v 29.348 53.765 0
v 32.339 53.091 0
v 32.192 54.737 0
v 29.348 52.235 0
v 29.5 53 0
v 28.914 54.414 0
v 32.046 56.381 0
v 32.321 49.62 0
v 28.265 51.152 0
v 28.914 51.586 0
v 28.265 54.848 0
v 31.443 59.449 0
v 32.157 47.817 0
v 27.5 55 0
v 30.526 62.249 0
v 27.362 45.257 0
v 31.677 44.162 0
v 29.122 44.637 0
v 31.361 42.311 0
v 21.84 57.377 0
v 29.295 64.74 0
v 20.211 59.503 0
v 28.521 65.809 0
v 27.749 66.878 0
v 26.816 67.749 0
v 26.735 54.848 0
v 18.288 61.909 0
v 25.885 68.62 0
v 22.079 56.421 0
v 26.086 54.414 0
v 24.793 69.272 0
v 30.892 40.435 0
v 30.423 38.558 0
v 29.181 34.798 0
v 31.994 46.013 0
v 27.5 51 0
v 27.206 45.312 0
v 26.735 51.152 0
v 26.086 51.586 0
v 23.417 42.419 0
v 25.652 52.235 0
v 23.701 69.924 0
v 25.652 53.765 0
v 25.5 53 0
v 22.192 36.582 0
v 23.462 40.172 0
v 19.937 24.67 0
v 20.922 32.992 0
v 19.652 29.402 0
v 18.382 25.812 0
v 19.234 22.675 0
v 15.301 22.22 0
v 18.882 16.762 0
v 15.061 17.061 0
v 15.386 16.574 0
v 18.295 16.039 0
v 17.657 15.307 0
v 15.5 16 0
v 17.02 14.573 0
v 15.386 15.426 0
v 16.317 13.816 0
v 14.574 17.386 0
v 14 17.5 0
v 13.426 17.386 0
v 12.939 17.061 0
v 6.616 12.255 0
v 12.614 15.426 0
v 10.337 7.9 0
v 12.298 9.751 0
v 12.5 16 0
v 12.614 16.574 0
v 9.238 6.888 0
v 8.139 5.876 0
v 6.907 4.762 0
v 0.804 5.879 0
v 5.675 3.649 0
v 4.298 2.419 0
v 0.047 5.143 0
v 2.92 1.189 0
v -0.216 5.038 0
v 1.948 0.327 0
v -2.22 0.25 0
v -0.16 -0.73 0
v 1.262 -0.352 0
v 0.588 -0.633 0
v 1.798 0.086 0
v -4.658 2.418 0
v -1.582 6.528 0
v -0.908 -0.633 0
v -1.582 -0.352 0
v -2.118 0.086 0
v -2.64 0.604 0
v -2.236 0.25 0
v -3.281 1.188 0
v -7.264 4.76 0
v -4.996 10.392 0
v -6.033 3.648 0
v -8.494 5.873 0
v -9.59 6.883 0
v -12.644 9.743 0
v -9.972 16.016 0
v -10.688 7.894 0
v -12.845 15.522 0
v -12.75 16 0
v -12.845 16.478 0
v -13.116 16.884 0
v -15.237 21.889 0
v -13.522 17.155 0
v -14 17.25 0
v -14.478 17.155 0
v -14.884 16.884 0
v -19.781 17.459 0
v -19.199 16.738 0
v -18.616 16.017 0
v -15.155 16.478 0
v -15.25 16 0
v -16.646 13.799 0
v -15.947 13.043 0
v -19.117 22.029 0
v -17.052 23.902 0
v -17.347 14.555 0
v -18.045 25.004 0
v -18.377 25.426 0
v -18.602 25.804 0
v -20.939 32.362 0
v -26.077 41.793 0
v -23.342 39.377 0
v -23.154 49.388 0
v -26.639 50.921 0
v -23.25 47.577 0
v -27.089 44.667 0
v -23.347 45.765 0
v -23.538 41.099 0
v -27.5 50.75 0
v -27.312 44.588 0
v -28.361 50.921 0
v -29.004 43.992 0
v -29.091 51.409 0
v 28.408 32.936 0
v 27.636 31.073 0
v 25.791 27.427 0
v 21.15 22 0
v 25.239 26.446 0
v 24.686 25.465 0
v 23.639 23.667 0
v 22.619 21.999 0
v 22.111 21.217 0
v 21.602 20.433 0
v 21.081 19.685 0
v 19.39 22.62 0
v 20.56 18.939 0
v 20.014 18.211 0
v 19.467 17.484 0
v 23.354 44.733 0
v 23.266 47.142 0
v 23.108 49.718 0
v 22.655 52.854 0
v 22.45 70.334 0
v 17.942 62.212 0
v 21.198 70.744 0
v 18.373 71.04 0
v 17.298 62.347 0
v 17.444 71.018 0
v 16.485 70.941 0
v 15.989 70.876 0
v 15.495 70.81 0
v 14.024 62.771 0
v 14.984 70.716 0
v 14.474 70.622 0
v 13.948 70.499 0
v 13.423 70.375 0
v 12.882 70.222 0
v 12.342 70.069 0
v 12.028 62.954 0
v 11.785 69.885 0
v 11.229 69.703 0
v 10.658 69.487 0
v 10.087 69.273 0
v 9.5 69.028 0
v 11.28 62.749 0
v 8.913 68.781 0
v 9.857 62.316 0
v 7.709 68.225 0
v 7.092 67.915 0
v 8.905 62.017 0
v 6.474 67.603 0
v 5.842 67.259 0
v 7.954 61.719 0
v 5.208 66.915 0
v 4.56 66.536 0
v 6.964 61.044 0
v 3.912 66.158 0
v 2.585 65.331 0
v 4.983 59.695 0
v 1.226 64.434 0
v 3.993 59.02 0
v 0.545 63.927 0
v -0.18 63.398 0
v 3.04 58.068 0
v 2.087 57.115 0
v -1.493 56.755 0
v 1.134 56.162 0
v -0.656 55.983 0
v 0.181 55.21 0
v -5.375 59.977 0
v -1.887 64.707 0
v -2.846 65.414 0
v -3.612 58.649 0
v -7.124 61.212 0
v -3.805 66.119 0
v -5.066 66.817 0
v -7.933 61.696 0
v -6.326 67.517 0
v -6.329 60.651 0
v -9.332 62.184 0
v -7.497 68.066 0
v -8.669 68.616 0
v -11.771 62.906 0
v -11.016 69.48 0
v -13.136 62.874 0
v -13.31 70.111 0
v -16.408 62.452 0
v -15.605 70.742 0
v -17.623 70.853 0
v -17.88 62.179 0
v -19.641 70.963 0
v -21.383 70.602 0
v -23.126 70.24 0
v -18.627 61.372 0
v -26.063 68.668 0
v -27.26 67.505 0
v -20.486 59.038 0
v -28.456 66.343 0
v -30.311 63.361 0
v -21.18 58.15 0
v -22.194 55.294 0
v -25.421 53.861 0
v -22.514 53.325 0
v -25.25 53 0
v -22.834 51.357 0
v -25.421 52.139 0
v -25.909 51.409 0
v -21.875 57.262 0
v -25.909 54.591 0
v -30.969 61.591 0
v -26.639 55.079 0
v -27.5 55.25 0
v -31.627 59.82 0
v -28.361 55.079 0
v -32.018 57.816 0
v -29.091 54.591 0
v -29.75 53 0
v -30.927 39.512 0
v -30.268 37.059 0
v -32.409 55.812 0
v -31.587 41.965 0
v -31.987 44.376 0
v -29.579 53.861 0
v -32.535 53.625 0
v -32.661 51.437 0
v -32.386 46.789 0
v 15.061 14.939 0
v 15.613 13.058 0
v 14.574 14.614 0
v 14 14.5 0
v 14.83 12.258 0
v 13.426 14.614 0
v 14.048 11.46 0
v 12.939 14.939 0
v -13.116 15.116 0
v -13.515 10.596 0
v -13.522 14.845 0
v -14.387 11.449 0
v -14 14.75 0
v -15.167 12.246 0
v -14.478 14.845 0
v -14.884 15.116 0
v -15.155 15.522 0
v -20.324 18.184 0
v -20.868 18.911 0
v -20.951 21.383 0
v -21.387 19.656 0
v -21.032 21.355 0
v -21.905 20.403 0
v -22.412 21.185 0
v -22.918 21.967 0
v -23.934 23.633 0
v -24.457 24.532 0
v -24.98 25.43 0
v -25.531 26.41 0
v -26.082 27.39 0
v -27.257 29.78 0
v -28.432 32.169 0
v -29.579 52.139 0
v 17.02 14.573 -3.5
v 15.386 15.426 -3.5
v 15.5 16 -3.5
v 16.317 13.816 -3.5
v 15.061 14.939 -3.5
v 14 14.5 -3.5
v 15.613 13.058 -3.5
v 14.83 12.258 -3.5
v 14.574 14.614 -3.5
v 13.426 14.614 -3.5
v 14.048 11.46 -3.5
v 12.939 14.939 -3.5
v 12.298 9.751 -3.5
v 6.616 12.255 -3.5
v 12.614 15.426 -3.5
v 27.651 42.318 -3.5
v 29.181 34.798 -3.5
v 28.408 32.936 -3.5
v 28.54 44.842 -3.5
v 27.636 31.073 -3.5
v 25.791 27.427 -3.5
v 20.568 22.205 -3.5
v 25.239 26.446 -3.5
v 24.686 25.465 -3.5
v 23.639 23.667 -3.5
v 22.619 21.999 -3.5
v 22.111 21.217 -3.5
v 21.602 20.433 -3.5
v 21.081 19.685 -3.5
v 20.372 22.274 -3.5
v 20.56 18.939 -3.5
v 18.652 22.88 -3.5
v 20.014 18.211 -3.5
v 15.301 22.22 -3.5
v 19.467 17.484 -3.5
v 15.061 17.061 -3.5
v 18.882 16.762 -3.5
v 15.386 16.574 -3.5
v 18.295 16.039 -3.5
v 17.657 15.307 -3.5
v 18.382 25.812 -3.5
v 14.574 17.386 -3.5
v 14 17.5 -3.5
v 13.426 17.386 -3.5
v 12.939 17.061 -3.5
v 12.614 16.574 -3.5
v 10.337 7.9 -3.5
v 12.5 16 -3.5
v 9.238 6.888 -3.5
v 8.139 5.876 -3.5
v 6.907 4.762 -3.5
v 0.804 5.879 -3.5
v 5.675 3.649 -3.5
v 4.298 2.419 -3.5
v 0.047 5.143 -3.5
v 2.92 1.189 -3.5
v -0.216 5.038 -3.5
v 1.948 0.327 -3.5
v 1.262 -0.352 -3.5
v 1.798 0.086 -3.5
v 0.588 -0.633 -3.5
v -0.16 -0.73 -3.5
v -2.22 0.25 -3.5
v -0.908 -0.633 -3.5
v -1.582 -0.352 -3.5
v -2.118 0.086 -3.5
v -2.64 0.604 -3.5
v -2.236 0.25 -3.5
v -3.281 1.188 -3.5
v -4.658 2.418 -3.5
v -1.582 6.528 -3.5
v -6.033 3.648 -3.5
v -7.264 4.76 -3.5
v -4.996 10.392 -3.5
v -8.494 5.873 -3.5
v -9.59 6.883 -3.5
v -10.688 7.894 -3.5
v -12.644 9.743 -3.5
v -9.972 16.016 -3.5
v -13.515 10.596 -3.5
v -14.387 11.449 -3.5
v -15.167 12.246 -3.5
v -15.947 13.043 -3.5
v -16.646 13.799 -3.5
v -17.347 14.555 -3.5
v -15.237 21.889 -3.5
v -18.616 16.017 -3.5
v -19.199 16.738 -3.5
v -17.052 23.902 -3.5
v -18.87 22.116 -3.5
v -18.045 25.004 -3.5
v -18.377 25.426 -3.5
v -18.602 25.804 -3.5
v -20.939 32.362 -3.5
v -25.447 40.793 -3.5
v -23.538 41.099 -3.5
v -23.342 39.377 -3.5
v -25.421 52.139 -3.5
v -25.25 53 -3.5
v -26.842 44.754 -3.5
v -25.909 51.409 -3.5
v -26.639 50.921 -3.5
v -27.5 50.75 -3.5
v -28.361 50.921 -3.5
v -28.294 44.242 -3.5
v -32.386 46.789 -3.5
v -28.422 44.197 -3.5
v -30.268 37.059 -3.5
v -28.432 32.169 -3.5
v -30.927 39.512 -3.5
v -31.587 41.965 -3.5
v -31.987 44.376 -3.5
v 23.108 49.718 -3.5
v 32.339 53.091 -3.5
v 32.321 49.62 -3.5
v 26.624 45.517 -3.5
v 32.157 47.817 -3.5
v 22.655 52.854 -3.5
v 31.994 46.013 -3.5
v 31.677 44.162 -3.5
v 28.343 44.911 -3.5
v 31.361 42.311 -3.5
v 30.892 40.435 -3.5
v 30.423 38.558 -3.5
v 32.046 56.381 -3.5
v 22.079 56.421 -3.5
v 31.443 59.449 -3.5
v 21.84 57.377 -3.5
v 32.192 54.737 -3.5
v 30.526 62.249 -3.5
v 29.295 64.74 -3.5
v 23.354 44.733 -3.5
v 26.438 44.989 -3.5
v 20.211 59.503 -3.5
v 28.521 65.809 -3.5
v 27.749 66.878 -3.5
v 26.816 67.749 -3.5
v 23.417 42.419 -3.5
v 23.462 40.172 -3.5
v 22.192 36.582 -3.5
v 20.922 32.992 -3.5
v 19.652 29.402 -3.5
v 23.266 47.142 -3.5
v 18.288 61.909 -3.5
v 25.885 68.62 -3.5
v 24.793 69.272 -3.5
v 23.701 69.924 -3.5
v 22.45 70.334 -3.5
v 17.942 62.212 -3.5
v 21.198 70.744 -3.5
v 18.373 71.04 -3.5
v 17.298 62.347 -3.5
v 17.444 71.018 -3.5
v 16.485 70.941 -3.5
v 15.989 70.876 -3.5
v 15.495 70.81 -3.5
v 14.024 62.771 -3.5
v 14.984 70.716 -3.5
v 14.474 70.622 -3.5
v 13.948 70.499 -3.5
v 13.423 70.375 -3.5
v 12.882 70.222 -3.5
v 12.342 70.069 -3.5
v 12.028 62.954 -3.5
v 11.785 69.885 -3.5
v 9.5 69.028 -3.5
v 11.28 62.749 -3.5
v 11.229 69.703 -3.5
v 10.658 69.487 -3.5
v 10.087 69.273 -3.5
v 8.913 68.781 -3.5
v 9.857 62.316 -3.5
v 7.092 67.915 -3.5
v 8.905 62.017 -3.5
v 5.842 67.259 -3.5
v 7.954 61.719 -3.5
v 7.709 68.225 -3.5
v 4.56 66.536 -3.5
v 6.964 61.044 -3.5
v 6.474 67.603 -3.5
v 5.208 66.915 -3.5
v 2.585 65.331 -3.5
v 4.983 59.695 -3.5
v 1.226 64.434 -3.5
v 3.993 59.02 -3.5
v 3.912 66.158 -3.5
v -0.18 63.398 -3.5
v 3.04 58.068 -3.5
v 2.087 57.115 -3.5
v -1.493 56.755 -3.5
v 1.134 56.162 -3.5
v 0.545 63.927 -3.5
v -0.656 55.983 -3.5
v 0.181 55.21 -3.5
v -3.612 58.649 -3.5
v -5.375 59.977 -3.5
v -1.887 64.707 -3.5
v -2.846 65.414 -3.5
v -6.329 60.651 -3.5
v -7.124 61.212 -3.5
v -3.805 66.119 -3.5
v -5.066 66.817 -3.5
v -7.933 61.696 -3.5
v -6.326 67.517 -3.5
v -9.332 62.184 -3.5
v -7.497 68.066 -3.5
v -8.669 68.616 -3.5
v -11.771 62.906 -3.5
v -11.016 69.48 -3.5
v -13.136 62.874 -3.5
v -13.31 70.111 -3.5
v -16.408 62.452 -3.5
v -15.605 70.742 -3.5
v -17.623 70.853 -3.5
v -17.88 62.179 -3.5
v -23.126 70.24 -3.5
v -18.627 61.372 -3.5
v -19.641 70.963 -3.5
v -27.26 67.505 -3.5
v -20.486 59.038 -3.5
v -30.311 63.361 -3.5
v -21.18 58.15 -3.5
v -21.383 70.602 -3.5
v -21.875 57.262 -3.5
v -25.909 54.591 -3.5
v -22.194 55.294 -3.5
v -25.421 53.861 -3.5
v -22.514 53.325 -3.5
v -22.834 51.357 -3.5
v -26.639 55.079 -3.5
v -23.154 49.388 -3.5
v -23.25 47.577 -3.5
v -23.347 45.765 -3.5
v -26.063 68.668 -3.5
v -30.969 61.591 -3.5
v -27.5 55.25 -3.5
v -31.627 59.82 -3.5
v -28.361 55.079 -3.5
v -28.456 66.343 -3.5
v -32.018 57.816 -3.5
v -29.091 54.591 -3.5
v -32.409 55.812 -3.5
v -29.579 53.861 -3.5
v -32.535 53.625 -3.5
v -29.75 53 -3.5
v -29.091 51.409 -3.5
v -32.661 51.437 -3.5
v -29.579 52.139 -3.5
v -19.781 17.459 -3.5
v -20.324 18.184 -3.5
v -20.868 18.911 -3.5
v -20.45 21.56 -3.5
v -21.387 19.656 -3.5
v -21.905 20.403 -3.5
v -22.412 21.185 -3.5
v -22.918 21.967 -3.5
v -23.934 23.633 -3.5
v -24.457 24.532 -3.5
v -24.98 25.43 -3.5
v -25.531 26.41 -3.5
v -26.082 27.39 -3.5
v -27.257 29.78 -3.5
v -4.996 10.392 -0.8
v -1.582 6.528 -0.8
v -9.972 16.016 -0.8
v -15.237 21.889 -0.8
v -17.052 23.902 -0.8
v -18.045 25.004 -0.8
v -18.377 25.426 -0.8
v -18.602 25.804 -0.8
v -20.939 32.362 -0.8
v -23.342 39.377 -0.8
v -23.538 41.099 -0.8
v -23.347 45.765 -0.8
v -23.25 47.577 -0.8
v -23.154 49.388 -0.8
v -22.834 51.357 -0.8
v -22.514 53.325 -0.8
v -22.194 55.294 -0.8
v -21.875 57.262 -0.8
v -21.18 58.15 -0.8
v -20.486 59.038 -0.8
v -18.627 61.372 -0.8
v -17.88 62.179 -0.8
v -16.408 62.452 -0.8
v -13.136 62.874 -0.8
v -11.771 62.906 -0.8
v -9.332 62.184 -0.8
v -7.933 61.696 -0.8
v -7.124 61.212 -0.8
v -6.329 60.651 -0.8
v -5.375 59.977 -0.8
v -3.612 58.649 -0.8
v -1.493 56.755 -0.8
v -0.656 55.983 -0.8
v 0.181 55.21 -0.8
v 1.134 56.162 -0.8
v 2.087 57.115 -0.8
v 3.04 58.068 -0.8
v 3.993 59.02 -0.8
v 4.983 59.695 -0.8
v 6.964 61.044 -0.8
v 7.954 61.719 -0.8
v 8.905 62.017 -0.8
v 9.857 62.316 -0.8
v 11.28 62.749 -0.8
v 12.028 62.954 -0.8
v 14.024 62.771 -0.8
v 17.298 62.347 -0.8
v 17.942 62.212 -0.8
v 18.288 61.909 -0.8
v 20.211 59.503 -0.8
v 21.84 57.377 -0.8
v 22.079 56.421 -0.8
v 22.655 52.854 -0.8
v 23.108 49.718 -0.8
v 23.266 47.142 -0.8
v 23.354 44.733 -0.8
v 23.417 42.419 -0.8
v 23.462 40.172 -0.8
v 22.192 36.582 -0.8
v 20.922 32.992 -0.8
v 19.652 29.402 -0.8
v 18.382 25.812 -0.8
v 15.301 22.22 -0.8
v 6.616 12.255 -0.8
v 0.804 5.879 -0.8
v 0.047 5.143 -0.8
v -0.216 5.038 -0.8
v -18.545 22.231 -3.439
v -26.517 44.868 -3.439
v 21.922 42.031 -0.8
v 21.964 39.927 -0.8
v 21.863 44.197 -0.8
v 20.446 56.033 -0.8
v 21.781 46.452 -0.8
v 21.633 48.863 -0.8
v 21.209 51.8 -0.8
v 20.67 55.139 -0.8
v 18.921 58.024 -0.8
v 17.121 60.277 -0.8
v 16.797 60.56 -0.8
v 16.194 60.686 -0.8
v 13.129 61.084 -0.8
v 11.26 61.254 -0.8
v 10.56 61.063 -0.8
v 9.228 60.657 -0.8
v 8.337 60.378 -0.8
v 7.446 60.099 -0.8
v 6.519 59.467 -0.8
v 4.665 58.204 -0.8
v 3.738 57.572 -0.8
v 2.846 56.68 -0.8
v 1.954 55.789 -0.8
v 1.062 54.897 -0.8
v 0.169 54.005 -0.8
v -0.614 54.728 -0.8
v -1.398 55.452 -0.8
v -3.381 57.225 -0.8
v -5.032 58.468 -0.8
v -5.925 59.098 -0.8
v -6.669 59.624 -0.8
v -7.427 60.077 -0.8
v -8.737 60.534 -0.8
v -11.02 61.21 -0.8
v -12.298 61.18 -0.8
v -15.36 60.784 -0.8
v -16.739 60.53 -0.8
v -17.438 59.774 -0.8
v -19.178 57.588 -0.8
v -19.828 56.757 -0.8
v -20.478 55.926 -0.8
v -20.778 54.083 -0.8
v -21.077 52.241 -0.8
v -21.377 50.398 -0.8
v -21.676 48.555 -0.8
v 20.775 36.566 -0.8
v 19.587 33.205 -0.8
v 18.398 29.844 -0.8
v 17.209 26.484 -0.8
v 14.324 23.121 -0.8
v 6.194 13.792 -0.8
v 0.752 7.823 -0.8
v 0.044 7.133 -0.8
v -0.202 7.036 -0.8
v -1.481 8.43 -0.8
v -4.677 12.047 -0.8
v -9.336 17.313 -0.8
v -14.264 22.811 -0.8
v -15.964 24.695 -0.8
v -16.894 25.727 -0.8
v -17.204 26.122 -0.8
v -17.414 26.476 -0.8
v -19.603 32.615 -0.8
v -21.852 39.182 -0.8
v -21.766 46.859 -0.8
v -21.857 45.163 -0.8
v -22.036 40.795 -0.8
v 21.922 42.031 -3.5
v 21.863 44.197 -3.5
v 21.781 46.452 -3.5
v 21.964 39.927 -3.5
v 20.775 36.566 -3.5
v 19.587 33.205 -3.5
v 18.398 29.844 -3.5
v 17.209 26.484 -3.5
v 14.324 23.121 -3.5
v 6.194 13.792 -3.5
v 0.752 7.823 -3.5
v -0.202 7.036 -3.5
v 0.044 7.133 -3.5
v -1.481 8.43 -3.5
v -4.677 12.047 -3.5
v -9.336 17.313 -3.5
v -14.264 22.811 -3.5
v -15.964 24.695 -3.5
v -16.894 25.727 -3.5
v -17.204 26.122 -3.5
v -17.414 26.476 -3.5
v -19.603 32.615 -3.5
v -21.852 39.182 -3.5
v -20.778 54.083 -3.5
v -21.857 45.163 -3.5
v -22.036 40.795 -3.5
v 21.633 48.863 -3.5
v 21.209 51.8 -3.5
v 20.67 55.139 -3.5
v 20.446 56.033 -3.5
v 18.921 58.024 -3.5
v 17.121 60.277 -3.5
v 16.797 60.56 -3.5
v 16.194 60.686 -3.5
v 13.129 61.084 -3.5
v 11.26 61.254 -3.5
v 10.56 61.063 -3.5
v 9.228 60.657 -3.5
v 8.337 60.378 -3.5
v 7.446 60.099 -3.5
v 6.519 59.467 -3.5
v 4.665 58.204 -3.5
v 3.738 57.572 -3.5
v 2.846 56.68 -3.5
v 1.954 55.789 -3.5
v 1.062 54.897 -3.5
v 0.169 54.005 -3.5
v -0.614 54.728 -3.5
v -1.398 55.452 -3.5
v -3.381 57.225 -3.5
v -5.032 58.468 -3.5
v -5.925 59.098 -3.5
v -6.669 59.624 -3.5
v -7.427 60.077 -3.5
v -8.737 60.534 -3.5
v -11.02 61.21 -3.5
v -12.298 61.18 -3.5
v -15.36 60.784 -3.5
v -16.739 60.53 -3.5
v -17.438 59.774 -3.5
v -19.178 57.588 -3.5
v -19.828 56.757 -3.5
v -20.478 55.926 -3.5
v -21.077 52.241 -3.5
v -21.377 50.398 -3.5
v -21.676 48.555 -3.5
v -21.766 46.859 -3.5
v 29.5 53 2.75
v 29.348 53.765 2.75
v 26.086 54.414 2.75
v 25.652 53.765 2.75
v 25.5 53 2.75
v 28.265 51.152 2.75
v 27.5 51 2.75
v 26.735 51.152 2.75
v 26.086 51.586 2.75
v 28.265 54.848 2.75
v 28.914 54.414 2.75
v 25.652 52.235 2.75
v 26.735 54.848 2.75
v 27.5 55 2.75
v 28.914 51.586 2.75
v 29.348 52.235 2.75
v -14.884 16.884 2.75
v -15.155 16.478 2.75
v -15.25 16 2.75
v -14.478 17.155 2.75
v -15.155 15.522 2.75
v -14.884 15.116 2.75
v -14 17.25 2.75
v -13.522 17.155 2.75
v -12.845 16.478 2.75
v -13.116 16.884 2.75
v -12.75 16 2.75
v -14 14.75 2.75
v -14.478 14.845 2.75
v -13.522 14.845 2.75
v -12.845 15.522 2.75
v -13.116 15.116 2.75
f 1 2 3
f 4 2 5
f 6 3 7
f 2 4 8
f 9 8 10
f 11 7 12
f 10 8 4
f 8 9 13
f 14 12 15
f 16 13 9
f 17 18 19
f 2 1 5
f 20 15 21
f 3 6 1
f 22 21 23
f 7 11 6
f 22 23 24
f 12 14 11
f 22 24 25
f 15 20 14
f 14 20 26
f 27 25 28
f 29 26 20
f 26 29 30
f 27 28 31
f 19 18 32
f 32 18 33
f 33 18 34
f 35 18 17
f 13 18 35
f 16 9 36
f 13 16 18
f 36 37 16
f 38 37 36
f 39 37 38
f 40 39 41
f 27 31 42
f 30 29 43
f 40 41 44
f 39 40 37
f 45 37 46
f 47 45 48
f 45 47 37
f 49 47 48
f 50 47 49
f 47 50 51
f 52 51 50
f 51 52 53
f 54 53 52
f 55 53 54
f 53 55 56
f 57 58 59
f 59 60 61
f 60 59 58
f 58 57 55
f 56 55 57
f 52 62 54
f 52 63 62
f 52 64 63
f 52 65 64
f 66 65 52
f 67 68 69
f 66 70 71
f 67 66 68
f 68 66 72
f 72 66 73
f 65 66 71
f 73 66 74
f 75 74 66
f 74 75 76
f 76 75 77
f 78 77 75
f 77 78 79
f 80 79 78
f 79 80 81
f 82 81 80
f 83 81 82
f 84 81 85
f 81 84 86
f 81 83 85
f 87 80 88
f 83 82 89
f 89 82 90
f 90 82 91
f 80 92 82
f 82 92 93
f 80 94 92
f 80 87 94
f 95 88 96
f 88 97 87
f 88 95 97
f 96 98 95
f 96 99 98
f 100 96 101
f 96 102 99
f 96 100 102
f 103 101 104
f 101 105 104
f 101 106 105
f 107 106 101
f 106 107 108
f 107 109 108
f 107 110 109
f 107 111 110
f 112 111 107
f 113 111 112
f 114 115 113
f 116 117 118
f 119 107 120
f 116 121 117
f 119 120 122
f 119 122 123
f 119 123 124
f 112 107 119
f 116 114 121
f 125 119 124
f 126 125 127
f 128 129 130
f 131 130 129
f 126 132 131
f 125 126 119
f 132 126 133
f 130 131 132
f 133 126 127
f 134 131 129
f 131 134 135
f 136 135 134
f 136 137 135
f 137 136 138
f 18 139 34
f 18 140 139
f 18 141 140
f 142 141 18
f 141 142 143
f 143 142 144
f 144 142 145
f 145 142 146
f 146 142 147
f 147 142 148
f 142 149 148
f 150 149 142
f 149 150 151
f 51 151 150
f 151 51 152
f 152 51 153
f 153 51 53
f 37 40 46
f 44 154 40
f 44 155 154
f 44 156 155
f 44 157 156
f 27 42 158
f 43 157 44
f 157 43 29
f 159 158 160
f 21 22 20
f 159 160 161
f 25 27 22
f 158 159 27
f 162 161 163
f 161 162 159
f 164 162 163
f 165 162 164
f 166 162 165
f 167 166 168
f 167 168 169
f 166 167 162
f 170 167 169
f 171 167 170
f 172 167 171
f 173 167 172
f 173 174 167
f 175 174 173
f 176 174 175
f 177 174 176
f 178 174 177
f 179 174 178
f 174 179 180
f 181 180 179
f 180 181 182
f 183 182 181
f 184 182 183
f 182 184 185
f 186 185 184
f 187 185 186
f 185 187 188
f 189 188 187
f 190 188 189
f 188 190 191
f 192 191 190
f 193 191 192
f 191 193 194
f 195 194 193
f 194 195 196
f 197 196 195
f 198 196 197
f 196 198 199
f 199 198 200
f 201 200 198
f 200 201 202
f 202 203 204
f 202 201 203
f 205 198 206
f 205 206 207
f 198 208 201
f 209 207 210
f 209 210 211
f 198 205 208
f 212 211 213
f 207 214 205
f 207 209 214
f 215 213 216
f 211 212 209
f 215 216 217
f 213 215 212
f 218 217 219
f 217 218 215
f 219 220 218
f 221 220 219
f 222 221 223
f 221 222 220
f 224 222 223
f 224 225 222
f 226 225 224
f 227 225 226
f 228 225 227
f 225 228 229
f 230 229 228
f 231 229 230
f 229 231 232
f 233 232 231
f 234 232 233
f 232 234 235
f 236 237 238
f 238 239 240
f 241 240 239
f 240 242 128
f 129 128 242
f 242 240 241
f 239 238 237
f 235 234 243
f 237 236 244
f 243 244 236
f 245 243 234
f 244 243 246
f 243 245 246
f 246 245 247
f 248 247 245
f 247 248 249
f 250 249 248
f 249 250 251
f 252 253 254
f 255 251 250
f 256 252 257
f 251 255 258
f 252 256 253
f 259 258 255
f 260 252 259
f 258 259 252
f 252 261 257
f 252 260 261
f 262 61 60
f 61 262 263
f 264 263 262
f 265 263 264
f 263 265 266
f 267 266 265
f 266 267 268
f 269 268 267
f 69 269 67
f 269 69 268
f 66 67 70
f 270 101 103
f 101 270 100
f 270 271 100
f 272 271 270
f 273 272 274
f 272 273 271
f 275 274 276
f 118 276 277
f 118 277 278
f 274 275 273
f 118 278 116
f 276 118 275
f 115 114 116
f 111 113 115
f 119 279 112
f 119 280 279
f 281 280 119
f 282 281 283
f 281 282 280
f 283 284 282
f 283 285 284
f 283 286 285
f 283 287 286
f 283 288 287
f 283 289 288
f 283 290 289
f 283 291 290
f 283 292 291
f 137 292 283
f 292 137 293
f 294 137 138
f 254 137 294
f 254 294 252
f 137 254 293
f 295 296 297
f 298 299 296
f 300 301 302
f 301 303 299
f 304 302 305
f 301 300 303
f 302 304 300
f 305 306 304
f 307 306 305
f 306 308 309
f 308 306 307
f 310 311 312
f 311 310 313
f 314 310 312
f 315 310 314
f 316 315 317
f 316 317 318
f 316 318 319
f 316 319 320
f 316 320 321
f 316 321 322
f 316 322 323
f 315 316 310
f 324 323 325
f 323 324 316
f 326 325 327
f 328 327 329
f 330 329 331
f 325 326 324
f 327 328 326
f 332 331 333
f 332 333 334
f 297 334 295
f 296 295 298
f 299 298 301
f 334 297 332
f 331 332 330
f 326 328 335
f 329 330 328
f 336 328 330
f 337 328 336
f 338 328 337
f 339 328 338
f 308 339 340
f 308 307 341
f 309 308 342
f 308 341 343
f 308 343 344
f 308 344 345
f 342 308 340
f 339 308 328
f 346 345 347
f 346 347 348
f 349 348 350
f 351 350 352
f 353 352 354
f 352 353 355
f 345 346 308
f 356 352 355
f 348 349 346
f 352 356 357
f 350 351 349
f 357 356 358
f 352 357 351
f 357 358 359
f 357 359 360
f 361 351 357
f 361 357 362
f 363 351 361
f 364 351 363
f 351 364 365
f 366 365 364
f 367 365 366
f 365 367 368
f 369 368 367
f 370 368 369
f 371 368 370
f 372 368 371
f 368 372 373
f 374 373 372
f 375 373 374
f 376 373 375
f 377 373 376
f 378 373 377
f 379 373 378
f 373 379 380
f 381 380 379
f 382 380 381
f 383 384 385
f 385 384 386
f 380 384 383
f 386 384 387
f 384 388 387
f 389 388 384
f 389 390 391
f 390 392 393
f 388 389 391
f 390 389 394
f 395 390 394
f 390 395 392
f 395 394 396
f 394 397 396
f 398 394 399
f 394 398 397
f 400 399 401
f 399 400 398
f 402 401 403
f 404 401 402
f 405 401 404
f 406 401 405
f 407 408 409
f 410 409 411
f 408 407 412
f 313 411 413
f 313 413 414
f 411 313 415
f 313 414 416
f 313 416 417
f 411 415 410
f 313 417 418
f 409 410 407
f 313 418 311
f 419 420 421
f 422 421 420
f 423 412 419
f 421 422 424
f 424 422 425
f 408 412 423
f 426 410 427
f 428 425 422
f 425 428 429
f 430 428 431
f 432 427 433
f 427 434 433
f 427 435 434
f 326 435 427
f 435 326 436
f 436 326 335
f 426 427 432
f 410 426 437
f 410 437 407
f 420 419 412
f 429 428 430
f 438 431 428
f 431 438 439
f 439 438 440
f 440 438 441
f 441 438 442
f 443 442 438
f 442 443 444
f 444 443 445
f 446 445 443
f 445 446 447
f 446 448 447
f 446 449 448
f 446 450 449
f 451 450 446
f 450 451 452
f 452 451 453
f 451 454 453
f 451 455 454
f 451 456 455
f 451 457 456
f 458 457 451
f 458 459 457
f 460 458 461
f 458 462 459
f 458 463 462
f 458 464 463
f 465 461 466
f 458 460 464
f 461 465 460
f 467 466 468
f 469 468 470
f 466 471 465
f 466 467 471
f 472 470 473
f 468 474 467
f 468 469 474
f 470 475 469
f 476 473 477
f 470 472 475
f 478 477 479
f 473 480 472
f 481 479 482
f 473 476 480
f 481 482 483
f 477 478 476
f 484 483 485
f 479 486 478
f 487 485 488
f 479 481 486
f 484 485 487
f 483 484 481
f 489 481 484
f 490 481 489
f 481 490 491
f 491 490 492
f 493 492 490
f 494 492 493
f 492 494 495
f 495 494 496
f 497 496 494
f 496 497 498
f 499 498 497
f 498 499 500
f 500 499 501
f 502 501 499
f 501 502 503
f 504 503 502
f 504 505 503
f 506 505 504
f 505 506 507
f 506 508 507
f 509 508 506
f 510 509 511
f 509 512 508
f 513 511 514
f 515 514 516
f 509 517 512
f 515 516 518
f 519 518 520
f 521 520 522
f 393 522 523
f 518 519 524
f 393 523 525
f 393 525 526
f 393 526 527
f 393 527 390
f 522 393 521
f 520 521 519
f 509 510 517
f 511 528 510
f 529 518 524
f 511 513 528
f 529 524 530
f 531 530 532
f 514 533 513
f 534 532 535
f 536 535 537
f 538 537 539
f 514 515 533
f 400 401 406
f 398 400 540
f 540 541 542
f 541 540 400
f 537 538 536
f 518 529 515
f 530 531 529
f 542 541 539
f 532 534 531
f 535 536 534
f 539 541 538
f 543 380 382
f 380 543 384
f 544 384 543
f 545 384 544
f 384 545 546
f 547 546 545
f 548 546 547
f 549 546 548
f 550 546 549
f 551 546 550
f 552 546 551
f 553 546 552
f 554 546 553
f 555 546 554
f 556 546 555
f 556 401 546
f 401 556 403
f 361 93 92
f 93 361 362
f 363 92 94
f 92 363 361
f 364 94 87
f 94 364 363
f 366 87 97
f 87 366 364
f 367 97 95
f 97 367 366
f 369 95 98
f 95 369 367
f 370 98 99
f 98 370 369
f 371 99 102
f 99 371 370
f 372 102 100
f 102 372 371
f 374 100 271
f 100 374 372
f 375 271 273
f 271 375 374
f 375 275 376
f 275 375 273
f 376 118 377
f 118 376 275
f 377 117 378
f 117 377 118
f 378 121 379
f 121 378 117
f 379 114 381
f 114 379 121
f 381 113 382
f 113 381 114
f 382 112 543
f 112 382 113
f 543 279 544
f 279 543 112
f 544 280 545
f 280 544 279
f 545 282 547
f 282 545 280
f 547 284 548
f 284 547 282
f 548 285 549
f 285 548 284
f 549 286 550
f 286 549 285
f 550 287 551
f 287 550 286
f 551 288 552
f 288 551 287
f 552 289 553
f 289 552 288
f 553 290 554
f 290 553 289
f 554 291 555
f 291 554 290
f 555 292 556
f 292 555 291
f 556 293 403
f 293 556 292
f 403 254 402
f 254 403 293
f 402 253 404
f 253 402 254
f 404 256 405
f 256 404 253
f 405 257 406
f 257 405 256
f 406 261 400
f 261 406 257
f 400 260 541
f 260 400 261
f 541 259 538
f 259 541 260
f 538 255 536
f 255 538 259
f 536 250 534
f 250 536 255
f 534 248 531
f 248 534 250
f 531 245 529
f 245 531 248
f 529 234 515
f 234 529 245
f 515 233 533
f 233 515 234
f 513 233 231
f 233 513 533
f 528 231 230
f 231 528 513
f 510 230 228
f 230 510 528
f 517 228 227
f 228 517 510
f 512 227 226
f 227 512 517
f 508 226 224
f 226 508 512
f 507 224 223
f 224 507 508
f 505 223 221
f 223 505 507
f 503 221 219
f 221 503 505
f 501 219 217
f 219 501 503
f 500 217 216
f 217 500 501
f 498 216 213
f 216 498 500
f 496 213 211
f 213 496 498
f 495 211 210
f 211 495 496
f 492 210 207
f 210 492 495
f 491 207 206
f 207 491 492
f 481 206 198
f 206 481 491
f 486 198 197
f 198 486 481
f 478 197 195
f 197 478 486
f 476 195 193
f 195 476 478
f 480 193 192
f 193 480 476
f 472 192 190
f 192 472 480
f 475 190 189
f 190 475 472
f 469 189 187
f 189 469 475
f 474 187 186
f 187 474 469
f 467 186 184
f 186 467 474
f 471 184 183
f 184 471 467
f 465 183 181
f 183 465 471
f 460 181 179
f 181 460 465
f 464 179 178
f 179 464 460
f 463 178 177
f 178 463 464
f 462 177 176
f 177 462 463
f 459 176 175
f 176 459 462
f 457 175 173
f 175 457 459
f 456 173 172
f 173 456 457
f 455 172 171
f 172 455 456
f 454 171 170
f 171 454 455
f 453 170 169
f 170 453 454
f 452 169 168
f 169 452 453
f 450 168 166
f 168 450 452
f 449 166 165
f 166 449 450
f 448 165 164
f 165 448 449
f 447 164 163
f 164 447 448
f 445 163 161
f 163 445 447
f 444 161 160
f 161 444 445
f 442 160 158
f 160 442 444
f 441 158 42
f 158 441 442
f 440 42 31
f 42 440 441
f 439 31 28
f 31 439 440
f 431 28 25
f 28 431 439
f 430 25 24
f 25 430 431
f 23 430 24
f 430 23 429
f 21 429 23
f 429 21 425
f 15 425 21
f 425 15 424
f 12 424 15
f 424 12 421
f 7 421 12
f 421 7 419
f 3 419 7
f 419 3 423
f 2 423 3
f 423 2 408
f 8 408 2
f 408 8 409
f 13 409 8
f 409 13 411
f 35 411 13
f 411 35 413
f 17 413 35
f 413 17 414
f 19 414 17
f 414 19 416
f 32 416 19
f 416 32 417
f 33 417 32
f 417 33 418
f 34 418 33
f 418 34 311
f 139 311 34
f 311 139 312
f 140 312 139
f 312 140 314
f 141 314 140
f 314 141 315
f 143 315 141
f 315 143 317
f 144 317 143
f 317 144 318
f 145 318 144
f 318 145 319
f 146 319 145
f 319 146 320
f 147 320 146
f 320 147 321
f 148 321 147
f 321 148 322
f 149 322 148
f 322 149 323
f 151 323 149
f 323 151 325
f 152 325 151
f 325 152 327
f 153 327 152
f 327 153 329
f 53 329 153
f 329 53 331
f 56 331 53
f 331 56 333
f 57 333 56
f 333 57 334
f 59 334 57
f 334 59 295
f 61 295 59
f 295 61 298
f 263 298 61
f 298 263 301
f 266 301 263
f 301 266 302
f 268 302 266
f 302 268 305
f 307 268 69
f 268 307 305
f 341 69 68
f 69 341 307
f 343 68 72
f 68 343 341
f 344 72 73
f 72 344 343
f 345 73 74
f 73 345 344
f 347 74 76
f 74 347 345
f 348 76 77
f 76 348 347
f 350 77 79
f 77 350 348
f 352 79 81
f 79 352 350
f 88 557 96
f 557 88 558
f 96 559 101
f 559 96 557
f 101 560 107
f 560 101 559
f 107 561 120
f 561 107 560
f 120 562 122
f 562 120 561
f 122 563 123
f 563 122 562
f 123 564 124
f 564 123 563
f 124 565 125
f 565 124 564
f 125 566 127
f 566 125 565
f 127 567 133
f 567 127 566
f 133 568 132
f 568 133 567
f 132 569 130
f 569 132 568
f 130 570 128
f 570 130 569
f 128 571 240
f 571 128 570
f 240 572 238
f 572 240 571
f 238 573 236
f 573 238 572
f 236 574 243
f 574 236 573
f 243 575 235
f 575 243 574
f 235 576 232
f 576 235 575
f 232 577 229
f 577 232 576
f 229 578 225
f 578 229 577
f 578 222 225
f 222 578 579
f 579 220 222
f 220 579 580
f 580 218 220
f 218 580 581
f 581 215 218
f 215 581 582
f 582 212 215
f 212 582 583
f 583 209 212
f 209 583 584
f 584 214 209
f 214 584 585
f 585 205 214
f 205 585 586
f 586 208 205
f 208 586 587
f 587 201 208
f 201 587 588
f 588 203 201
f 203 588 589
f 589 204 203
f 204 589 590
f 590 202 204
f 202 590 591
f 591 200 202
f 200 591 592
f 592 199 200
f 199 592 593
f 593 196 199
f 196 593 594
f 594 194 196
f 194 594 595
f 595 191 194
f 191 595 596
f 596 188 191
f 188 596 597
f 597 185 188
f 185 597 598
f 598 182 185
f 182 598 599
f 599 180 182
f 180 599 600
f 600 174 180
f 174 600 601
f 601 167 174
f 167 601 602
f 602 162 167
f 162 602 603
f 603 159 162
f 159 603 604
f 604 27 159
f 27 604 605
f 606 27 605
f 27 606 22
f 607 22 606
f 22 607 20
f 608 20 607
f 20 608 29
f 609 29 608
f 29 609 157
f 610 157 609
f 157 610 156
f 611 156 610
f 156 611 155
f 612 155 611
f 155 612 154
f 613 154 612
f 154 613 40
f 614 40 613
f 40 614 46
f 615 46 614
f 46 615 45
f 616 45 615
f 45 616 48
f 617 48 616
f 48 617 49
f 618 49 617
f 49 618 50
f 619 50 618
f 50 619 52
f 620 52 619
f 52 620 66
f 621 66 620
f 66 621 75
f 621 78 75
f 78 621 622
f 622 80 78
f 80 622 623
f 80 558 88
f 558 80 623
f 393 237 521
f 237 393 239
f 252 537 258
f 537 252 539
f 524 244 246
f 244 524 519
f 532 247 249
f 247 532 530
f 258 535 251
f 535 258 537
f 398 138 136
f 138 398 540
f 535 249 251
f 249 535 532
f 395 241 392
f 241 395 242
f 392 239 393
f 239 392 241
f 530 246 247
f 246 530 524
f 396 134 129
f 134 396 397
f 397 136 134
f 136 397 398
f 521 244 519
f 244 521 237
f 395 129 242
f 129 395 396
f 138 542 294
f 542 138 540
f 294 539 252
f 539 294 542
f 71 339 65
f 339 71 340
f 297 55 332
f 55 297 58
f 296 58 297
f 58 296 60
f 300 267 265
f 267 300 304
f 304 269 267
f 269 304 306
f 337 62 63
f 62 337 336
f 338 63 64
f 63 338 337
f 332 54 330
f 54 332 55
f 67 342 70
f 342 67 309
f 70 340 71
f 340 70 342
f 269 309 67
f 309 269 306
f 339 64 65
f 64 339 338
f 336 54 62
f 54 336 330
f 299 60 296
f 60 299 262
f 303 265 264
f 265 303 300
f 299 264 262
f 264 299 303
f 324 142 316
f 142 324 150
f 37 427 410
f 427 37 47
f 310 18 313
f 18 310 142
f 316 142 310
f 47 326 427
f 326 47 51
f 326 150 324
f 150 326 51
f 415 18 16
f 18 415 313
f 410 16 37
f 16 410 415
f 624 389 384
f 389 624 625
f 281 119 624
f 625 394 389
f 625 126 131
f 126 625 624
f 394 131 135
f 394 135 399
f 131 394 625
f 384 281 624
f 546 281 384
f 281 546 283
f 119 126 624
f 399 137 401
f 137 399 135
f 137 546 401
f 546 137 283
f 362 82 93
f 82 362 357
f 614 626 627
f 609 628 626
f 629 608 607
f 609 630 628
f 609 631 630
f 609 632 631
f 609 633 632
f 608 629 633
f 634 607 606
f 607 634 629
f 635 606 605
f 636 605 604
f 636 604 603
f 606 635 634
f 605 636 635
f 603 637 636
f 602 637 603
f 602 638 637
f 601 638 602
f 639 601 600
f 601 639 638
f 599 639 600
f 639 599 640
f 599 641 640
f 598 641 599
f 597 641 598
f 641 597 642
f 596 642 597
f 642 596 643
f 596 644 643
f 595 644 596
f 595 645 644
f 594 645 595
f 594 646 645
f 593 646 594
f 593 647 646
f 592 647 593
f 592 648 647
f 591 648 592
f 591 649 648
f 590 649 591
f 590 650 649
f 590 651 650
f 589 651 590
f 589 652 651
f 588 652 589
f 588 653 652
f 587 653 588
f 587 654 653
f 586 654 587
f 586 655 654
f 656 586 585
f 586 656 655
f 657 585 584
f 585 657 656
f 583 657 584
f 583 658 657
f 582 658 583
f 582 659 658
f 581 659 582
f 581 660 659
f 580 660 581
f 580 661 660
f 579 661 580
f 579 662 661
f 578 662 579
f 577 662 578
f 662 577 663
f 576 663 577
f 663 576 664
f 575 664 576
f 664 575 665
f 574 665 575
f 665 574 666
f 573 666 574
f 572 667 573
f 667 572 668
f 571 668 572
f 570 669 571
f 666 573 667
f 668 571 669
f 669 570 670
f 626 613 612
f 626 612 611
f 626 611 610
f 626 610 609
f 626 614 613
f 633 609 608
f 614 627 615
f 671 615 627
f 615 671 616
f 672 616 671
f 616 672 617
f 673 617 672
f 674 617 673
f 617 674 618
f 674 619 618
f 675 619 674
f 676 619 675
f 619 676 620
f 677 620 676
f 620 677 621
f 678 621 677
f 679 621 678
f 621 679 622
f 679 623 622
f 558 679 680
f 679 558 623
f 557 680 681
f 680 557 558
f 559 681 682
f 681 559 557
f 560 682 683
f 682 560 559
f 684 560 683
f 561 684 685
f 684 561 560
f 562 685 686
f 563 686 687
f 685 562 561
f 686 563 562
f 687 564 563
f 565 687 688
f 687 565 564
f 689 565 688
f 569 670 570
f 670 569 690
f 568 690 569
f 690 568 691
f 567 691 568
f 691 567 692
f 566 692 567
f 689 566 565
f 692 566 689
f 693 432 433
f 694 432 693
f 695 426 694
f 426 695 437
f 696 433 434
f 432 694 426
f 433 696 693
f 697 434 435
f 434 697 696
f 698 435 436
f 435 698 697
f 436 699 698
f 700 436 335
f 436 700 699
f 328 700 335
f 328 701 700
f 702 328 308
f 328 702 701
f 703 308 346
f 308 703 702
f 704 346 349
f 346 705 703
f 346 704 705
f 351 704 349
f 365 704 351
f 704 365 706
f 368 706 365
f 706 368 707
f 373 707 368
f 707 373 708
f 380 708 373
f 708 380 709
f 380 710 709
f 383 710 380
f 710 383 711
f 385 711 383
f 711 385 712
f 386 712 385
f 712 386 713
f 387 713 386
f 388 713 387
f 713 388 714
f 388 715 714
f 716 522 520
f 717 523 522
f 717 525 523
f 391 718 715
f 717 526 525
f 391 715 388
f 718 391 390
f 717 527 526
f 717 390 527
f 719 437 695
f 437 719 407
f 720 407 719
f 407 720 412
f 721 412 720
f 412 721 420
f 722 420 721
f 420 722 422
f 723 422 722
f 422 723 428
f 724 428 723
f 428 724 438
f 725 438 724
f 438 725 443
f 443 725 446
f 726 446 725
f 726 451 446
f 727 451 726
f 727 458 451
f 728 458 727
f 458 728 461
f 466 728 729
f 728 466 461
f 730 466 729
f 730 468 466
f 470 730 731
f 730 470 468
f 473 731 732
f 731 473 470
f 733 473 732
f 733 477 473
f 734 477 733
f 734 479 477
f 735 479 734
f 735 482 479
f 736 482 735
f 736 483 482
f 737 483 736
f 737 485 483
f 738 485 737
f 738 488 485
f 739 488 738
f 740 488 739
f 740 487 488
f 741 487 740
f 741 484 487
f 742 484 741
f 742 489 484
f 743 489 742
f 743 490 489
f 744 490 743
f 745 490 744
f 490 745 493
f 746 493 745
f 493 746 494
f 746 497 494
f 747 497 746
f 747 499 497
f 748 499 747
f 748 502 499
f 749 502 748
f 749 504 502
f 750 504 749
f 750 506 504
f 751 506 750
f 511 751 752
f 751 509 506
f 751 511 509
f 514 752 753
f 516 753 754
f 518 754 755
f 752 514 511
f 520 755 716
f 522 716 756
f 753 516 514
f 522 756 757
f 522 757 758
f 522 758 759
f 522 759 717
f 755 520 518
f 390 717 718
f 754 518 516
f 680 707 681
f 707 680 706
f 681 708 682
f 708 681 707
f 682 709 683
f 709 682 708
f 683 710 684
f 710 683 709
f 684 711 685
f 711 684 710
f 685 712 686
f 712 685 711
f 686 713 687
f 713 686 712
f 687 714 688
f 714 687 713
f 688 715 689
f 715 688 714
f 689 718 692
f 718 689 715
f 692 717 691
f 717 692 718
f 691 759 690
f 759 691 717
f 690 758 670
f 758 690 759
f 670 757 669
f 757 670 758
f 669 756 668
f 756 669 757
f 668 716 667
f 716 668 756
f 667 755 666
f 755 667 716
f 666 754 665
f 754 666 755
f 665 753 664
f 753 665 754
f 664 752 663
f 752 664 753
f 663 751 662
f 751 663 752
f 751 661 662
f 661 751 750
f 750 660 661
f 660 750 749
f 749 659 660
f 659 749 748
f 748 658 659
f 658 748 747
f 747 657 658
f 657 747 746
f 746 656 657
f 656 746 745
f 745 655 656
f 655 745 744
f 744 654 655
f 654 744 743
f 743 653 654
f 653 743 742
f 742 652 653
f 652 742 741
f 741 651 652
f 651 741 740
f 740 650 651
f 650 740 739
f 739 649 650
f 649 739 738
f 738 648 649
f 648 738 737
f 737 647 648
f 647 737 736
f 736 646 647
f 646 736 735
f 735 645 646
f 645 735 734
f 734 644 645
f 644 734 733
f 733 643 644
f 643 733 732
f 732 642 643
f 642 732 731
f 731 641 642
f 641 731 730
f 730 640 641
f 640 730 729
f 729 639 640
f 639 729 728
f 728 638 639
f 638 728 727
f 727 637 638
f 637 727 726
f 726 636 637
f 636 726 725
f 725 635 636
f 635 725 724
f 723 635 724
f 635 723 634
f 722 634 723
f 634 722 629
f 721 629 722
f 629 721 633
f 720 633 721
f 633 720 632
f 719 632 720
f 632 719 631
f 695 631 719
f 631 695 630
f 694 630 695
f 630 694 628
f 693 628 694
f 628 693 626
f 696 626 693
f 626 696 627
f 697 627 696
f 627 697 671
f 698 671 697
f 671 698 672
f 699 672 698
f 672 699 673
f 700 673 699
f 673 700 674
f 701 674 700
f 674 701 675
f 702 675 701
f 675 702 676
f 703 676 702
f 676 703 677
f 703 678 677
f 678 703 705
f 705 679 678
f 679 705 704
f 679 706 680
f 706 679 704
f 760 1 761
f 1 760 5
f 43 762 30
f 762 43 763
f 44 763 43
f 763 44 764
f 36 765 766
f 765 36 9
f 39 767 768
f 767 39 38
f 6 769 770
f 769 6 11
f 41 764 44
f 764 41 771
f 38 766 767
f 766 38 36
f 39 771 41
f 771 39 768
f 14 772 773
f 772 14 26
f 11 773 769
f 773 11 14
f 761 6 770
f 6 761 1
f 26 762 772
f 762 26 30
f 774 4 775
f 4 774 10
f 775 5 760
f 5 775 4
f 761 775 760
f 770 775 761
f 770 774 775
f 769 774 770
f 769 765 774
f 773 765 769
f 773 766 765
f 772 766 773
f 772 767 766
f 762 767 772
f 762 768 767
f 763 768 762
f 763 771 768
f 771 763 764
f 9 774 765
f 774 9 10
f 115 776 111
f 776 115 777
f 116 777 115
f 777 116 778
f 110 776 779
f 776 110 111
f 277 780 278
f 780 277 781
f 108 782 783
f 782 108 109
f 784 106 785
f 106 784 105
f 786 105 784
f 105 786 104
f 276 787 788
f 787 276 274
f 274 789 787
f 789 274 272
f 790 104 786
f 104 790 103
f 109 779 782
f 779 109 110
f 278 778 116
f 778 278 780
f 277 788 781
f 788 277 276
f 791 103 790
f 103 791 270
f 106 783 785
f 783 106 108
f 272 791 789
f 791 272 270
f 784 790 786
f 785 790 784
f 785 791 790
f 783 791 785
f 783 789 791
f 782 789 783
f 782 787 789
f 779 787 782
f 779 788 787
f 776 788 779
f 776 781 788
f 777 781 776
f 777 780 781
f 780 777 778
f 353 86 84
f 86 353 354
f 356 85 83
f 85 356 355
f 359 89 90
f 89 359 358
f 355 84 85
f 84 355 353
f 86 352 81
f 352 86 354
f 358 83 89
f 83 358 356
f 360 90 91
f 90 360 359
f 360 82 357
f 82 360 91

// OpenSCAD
rotate([0,180,0]) union() {
	difference() {
		translate([-32.5,-1.75,0]) linear_extrude(3.5) resize([65,0,0],auto=true) import("outer_heart.dxf");
		translate([-23.5,5,0]) linear_extrude(3.5) resize([47,0,0],auto=true) import("inner_heart.dxf");
		translate([27.5,53,1.75]) cylinder(r=2.25,h=3.5,center=true,$fn=16);
		translate([-14,16,1.75]) cylinder(r=1.5,h=3.5,center=true,$fn=16);
		translate([-21.15,22,0]) rotate([0,10,19.4]) cube([2,24,4]);
		translate([19.2,22,-0.5]) rotate([0,-10,-19.4]) cube([2,24,4]);
		// For pointed tip comment this line and the last
		translate([-2.4,-1.75,0]) cube([5,2,3.5]);
	}
	translate([0,0,.8]) difference() {
		translate([-23.5,5,0]) linear_extrude(2.7) resize([47,0,0],auto=true) import("inner_heart.dxf");
		translate([-22,7,0]) linear_extrude(2.7) resize([44,0,0],auto=true) import("inner_heart.dxf");
	}
	translate([-27.5,53,-1]) cylinder(r=2,h=3.5,center=true,$fn=16);
	translate([14,16,-1]) cylinder(r=1.25,h=3.5,center=true,$fn=16);
	// for pointed tip comment this line and the indicated one above
    translate([0.16,1.25,0]) scale([1.1,.9,1]) linear_extrude(3.5) circle(2.2,$fn=20);
}
